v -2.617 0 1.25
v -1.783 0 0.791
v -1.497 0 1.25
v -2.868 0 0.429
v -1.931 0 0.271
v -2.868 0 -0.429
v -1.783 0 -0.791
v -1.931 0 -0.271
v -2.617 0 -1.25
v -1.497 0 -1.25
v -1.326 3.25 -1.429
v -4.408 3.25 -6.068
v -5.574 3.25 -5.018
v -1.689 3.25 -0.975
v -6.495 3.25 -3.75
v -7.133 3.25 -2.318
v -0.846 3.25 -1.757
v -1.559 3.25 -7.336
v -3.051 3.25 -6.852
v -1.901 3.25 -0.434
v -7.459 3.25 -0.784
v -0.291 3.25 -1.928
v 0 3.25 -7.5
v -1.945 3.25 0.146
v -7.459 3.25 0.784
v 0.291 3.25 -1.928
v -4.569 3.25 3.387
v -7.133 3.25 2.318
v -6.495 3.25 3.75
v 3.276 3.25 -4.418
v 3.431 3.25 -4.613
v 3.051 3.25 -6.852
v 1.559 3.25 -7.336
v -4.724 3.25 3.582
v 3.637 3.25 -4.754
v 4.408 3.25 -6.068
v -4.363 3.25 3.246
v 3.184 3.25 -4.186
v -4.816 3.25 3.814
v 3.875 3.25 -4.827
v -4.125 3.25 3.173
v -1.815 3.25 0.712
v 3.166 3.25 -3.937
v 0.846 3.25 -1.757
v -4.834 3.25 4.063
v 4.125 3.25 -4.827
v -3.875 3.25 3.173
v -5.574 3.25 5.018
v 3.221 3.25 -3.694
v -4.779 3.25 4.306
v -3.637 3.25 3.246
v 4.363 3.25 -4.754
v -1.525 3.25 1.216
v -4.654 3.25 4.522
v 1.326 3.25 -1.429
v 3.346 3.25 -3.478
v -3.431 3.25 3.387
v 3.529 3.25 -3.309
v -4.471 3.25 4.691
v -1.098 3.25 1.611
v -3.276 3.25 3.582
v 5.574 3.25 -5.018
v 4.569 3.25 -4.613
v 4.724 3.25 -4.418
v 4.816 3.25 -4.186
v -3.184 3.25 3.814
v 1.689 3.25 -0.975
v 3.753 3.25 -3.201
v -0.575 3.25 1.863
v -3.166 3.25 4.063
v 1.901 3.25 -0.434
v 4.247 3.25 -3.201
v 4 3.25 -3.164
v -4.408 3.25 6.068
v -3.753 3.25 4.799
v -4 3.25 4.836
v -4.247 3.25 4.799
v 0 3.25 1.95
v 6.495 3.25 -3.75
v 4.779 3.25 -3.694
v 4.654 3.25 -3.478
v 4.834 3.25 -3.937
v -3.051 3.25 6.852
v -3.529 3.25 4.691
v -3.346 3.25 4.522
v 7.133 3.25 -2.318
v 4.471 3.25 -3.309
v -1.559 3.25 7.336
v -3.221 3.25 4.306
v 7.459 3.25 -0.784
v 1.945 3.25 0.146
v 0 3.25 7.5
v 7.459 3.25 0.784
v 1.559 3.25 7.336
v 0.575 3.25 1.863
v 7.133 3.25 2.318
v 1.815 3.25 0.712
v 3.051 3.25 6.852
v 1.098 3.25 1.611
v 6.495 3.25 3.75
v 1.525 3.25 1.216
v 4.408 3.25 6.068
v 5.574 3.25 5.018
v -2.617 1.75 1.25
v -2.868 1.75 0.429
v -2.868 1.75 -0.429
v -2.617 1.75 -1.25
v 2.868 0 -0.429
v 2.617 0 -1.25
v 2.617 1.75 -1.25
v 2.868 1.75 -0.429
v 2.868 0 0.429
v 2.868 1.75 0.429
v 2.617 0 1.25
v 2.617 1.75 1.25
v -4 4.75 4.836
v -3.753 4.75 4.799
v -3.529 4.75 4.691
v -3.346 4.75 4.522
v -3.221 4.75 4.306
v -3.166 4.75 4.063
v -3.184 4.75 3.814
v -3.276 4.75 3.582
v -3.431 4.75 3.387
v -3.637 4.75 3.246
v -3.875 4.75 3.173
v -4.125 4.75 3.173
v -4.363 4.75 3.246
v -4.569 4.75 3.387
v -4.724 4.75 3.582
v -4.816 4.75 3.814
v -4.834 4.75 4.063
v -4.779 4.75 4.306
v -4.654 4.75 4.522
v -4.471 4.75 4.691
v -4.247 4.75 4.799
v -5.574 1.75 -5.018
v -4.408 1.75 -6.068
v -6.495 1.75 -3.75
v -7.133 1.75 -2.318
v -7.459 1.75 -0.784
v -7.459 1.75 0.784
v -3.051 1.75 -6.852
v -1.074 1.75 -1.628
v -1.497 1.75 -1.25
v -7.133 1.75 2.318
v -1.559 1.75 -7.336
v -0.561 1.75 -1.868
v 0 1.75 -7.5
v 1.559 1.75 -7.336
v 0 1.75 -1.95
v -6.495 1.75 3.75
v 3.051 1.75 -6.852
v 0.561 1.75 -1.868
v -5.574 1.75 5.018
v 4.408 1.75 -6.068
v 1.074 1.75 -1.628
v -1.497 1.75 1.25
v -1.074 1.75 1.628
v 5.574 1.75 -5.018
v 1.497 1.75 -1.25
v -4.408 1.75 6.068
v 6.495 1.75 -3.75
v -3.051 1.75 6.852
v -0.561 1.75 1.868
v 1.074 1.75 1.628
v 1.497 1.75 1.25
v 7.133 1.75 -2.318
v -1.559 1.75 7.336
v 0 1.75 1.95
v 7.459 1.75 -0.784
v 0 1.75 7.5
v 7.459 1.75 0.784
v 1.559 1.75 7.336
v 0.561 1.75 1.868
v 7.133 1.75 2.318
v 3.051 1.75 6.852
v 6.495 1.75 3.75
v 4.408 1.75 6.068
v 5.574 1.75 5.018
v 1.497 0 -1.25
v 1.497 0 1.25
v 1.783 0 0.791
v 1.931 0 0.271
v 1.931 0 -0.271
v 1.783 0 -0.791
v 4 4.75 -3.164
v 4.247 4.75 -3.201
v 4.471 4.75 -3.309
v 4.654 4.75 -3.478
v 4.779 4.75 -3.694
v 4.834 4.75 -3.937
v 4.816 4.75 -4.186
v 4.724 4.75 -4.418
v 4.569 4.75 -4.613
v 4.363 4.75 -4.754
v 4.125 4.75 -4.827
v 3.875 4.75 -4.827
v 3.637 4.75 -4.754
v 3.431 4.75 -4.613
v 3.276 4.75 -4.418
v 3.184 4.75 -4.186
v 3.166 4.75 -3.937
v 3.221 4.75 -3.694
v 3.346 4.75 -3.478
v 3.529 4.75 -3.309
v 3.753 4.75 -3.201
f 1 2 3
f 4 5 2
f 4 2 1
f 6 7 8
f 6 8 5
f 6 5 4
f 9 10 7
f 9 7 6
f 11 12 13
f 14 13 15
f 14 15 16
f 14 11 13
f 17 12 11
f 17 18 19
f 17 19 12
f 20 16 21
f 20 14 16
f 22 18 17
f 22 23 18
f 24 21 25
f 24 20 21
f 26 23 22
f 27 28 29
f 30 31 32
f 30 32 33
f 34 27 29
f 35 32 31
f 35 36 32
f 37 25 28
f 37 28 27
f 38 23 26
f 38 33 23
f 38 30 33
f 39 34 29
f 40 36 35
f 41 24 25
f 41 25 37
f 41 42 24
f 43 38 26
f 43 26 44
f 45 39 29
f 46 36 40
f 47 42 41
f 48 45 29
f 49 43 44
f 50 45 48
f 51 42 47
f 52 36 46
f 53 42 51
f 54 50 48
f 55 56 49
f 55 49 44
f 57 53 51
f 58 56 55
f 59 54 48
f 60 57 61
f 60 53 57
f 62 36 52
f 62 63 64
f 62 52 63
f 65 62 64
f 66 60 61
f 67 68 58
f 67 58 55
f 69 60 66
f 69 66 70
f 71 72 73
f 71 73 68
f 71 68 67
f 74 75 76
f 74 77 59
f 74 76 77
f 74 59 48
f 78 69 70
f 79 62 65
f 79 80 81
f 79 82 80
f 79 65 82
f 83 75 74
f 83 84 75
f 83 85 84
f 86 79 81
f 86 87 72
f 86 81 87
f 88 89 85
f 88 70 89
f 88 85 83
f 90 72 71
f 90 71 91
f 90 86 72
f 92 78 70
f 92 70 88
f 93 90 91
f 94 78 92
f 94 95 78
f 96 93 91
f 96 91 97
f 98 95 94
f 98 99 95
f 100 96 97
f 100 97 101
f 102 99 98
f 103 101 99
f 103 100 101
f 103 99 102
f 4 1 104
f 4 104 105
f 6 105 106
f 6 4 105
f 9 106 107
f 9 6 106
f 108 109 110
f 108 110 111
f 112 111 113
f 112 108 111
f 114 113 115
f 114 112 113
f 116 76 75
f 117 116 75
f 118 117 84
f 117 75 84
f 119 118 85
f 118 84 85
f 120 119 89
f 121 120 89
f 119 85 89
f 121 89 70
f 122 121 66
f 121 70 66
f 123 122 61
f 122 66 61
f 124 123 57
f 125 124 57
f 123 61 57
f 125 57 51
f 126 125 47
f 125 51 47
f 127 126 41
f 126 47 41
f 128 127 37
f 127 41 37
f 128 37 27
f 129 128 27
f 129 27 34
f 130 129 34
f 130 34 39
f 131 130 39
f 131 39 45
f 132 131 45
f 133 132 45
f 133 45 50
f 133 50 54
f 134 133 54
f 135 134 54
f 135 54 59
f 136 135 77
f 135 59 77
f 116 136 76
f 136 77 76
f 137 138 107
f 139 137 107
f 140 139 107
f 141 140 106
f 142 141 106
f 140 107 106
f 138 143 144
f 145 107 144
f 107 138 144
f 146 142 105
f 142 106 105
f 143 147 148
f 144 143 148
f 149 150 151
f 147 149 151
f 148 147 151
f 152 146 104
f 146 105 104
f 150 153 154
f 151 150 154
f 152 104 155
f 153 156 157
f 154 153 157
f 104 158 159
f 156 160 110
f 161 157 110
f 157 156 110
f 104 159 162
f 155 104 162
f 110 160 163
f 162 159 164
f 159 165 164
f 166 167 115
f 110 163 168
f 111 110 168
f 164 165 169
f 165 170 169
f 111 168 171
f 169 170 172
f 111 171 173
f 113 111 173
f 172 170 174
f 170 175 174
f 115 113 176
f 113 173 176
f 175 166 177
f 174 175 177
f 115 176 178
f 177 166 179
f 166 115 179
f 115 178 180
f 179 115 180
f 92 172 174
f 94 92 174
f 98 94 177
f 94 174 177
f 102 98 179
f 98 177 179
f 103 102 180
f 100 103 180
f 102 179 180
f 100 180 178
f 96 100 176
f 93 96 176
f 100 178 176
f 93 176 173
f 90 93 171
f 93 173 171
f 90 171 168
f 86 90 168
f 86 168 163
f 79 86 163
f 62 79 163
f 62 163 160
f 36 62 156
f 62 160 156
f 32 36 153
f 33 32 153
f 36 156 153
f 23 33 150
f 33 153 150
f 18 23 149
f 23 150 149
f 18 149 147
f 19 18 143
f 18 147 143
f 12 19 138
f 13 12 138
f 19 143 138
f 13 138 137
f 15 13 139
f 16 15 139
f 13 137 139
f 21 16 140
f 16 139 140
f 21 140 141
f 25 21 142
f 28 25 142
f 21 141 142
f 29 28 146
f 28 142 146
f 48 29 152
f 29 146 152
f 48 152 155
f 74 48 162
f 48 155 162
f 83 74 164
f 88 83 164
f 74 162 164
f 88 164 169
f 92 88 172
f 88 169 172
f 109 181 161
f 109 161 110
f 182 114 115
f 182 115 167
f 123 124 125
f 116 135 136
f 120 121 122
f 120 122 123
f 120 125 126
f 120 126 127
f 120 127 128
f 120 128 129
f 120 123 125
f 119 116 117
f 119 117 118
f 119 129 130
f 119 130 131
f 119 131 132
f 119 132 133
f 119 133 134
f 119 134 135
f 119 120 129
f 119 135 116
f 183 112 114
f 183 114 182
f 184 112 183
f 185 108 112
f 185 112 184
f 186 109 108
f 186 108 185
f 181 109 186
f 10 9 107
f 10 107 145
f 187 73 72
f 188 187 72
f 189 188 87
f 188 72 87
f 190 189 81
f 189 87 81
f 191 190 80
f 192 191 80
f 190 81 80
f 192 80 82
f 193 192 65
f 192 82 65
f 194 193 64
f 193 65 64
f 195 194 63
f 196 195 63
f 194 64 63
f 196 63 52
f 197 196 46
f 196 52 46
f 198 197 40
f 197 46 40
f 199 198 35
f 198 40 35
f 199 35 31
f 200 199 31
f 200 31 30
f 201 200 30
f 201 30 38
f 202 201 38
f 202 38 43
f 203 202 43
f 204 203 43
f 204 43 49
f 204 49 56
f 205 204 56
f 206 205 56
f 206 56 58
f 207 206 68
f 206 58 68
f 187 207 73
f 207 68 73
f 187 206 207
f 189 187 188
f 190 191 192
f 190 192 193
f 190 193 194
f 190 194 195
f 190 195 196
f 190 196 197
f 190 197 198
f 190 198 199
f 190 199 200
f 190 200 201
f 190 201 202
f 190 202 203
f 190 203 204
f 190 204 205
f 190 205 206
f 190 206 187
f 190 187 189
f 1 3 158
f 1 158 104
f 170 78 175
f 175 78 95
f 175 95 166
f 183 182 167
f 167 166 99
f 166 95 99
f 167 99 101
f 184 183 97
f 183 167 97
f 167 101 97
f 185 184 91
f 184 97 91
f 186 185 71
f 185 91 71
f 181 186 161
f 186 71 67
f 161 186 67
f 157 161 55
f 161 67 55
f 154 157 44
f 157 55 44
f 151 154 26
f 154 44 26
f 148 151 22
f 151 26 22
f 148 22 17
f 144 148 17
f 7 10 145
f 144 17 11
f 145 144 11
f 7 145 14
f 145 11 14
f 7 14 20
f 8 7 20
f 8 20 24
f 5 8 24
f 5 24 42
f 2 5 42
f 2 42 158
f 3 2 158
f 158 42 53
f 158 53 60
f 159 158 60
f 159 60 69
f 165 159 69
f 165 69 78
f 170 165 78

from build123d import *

# Parameters (mm, degrees)
BOSS_EXTRUDE1_DEPTH = 1.75
SKETCH2_R           = 7.5
BOSS_EXTRUDE2_DEPTH = 1.5
SKETCH3_R           = 1.95
CUT_EXTRUDE1_DEPTH  = 12.093353866
SKETCH4_R           = 0.8365
BOSS_EXTRUDE3_DEPTH = 1.5


with BuildPart() as part:
    # Sketch1 → Boss-Extrude1 (new body)
    with BuildSketch(Plane(origin=(0, 0, 0), x_dir=(1, 0, 0), z_dir=(0, 1, 0))):
        with BuildLine():
            Line((-2.616772822, 1.25), (2.616772822, 1.25))
            ThreePointArc((2.616772822, 1.25), (2.9, 0), (2.616772822, -1.25))
            Line((2.616772822, -1.25), (-2.616772822, -1.25))
            ThreePointArc((-2.616772822, -1.25), (-2.9, 0), (-2.616772822, 1.25))
        make_face()
    extrude(amount=BOSS_EXTRUDE1_DEPTH)

    # Sketch2 → Boss-Extrude2 (add)
    with BuildSketch(Plane(origin=(0, 1.75, 0), x_dir=(1, 0, 0), z_dir=(0, 1, 0))):
        with Locations(Location((0, 0, 0), (0, 0, 270))):
            Circle(SKETCH2_R)
    extrude(amount=BOSS_EXTRUDE2_DEPTH)

    # Sketch3 → Cut-Extrude1 (cut, through all)
    with BuildSketch(Plane(origin=(0, 3.25, 0), x_dir=(1, 0, 0), z_dir=(0, 1, 0))):
        with Locations(Location((0, 0, 0), (0, 0, 270))):
            Circle(SKETCH3_R)
    extrude(amount=-CUT_EXTRUDE1_DEPTH, mode=Mode.SUBTRACT)

    # Sketch4 → Boss-Extrude3 (add)
    with BuildSketch(Plane(origin=(0, 3.25, 0), x_dir=(1, 0, 0), z_dir=(0, 1, 0))):
        with Locations(Location((4, 4, 0), (0, 0, 270))):
            Circle(SKETCH4_R)
        with Locations(Location((-4, -4, 0), (0, 0, 270))):
            Circle(SKETCH4_R)
    extrude(amount=BOSS_EXTRUDE3_DEPTH)


solid = part.part
